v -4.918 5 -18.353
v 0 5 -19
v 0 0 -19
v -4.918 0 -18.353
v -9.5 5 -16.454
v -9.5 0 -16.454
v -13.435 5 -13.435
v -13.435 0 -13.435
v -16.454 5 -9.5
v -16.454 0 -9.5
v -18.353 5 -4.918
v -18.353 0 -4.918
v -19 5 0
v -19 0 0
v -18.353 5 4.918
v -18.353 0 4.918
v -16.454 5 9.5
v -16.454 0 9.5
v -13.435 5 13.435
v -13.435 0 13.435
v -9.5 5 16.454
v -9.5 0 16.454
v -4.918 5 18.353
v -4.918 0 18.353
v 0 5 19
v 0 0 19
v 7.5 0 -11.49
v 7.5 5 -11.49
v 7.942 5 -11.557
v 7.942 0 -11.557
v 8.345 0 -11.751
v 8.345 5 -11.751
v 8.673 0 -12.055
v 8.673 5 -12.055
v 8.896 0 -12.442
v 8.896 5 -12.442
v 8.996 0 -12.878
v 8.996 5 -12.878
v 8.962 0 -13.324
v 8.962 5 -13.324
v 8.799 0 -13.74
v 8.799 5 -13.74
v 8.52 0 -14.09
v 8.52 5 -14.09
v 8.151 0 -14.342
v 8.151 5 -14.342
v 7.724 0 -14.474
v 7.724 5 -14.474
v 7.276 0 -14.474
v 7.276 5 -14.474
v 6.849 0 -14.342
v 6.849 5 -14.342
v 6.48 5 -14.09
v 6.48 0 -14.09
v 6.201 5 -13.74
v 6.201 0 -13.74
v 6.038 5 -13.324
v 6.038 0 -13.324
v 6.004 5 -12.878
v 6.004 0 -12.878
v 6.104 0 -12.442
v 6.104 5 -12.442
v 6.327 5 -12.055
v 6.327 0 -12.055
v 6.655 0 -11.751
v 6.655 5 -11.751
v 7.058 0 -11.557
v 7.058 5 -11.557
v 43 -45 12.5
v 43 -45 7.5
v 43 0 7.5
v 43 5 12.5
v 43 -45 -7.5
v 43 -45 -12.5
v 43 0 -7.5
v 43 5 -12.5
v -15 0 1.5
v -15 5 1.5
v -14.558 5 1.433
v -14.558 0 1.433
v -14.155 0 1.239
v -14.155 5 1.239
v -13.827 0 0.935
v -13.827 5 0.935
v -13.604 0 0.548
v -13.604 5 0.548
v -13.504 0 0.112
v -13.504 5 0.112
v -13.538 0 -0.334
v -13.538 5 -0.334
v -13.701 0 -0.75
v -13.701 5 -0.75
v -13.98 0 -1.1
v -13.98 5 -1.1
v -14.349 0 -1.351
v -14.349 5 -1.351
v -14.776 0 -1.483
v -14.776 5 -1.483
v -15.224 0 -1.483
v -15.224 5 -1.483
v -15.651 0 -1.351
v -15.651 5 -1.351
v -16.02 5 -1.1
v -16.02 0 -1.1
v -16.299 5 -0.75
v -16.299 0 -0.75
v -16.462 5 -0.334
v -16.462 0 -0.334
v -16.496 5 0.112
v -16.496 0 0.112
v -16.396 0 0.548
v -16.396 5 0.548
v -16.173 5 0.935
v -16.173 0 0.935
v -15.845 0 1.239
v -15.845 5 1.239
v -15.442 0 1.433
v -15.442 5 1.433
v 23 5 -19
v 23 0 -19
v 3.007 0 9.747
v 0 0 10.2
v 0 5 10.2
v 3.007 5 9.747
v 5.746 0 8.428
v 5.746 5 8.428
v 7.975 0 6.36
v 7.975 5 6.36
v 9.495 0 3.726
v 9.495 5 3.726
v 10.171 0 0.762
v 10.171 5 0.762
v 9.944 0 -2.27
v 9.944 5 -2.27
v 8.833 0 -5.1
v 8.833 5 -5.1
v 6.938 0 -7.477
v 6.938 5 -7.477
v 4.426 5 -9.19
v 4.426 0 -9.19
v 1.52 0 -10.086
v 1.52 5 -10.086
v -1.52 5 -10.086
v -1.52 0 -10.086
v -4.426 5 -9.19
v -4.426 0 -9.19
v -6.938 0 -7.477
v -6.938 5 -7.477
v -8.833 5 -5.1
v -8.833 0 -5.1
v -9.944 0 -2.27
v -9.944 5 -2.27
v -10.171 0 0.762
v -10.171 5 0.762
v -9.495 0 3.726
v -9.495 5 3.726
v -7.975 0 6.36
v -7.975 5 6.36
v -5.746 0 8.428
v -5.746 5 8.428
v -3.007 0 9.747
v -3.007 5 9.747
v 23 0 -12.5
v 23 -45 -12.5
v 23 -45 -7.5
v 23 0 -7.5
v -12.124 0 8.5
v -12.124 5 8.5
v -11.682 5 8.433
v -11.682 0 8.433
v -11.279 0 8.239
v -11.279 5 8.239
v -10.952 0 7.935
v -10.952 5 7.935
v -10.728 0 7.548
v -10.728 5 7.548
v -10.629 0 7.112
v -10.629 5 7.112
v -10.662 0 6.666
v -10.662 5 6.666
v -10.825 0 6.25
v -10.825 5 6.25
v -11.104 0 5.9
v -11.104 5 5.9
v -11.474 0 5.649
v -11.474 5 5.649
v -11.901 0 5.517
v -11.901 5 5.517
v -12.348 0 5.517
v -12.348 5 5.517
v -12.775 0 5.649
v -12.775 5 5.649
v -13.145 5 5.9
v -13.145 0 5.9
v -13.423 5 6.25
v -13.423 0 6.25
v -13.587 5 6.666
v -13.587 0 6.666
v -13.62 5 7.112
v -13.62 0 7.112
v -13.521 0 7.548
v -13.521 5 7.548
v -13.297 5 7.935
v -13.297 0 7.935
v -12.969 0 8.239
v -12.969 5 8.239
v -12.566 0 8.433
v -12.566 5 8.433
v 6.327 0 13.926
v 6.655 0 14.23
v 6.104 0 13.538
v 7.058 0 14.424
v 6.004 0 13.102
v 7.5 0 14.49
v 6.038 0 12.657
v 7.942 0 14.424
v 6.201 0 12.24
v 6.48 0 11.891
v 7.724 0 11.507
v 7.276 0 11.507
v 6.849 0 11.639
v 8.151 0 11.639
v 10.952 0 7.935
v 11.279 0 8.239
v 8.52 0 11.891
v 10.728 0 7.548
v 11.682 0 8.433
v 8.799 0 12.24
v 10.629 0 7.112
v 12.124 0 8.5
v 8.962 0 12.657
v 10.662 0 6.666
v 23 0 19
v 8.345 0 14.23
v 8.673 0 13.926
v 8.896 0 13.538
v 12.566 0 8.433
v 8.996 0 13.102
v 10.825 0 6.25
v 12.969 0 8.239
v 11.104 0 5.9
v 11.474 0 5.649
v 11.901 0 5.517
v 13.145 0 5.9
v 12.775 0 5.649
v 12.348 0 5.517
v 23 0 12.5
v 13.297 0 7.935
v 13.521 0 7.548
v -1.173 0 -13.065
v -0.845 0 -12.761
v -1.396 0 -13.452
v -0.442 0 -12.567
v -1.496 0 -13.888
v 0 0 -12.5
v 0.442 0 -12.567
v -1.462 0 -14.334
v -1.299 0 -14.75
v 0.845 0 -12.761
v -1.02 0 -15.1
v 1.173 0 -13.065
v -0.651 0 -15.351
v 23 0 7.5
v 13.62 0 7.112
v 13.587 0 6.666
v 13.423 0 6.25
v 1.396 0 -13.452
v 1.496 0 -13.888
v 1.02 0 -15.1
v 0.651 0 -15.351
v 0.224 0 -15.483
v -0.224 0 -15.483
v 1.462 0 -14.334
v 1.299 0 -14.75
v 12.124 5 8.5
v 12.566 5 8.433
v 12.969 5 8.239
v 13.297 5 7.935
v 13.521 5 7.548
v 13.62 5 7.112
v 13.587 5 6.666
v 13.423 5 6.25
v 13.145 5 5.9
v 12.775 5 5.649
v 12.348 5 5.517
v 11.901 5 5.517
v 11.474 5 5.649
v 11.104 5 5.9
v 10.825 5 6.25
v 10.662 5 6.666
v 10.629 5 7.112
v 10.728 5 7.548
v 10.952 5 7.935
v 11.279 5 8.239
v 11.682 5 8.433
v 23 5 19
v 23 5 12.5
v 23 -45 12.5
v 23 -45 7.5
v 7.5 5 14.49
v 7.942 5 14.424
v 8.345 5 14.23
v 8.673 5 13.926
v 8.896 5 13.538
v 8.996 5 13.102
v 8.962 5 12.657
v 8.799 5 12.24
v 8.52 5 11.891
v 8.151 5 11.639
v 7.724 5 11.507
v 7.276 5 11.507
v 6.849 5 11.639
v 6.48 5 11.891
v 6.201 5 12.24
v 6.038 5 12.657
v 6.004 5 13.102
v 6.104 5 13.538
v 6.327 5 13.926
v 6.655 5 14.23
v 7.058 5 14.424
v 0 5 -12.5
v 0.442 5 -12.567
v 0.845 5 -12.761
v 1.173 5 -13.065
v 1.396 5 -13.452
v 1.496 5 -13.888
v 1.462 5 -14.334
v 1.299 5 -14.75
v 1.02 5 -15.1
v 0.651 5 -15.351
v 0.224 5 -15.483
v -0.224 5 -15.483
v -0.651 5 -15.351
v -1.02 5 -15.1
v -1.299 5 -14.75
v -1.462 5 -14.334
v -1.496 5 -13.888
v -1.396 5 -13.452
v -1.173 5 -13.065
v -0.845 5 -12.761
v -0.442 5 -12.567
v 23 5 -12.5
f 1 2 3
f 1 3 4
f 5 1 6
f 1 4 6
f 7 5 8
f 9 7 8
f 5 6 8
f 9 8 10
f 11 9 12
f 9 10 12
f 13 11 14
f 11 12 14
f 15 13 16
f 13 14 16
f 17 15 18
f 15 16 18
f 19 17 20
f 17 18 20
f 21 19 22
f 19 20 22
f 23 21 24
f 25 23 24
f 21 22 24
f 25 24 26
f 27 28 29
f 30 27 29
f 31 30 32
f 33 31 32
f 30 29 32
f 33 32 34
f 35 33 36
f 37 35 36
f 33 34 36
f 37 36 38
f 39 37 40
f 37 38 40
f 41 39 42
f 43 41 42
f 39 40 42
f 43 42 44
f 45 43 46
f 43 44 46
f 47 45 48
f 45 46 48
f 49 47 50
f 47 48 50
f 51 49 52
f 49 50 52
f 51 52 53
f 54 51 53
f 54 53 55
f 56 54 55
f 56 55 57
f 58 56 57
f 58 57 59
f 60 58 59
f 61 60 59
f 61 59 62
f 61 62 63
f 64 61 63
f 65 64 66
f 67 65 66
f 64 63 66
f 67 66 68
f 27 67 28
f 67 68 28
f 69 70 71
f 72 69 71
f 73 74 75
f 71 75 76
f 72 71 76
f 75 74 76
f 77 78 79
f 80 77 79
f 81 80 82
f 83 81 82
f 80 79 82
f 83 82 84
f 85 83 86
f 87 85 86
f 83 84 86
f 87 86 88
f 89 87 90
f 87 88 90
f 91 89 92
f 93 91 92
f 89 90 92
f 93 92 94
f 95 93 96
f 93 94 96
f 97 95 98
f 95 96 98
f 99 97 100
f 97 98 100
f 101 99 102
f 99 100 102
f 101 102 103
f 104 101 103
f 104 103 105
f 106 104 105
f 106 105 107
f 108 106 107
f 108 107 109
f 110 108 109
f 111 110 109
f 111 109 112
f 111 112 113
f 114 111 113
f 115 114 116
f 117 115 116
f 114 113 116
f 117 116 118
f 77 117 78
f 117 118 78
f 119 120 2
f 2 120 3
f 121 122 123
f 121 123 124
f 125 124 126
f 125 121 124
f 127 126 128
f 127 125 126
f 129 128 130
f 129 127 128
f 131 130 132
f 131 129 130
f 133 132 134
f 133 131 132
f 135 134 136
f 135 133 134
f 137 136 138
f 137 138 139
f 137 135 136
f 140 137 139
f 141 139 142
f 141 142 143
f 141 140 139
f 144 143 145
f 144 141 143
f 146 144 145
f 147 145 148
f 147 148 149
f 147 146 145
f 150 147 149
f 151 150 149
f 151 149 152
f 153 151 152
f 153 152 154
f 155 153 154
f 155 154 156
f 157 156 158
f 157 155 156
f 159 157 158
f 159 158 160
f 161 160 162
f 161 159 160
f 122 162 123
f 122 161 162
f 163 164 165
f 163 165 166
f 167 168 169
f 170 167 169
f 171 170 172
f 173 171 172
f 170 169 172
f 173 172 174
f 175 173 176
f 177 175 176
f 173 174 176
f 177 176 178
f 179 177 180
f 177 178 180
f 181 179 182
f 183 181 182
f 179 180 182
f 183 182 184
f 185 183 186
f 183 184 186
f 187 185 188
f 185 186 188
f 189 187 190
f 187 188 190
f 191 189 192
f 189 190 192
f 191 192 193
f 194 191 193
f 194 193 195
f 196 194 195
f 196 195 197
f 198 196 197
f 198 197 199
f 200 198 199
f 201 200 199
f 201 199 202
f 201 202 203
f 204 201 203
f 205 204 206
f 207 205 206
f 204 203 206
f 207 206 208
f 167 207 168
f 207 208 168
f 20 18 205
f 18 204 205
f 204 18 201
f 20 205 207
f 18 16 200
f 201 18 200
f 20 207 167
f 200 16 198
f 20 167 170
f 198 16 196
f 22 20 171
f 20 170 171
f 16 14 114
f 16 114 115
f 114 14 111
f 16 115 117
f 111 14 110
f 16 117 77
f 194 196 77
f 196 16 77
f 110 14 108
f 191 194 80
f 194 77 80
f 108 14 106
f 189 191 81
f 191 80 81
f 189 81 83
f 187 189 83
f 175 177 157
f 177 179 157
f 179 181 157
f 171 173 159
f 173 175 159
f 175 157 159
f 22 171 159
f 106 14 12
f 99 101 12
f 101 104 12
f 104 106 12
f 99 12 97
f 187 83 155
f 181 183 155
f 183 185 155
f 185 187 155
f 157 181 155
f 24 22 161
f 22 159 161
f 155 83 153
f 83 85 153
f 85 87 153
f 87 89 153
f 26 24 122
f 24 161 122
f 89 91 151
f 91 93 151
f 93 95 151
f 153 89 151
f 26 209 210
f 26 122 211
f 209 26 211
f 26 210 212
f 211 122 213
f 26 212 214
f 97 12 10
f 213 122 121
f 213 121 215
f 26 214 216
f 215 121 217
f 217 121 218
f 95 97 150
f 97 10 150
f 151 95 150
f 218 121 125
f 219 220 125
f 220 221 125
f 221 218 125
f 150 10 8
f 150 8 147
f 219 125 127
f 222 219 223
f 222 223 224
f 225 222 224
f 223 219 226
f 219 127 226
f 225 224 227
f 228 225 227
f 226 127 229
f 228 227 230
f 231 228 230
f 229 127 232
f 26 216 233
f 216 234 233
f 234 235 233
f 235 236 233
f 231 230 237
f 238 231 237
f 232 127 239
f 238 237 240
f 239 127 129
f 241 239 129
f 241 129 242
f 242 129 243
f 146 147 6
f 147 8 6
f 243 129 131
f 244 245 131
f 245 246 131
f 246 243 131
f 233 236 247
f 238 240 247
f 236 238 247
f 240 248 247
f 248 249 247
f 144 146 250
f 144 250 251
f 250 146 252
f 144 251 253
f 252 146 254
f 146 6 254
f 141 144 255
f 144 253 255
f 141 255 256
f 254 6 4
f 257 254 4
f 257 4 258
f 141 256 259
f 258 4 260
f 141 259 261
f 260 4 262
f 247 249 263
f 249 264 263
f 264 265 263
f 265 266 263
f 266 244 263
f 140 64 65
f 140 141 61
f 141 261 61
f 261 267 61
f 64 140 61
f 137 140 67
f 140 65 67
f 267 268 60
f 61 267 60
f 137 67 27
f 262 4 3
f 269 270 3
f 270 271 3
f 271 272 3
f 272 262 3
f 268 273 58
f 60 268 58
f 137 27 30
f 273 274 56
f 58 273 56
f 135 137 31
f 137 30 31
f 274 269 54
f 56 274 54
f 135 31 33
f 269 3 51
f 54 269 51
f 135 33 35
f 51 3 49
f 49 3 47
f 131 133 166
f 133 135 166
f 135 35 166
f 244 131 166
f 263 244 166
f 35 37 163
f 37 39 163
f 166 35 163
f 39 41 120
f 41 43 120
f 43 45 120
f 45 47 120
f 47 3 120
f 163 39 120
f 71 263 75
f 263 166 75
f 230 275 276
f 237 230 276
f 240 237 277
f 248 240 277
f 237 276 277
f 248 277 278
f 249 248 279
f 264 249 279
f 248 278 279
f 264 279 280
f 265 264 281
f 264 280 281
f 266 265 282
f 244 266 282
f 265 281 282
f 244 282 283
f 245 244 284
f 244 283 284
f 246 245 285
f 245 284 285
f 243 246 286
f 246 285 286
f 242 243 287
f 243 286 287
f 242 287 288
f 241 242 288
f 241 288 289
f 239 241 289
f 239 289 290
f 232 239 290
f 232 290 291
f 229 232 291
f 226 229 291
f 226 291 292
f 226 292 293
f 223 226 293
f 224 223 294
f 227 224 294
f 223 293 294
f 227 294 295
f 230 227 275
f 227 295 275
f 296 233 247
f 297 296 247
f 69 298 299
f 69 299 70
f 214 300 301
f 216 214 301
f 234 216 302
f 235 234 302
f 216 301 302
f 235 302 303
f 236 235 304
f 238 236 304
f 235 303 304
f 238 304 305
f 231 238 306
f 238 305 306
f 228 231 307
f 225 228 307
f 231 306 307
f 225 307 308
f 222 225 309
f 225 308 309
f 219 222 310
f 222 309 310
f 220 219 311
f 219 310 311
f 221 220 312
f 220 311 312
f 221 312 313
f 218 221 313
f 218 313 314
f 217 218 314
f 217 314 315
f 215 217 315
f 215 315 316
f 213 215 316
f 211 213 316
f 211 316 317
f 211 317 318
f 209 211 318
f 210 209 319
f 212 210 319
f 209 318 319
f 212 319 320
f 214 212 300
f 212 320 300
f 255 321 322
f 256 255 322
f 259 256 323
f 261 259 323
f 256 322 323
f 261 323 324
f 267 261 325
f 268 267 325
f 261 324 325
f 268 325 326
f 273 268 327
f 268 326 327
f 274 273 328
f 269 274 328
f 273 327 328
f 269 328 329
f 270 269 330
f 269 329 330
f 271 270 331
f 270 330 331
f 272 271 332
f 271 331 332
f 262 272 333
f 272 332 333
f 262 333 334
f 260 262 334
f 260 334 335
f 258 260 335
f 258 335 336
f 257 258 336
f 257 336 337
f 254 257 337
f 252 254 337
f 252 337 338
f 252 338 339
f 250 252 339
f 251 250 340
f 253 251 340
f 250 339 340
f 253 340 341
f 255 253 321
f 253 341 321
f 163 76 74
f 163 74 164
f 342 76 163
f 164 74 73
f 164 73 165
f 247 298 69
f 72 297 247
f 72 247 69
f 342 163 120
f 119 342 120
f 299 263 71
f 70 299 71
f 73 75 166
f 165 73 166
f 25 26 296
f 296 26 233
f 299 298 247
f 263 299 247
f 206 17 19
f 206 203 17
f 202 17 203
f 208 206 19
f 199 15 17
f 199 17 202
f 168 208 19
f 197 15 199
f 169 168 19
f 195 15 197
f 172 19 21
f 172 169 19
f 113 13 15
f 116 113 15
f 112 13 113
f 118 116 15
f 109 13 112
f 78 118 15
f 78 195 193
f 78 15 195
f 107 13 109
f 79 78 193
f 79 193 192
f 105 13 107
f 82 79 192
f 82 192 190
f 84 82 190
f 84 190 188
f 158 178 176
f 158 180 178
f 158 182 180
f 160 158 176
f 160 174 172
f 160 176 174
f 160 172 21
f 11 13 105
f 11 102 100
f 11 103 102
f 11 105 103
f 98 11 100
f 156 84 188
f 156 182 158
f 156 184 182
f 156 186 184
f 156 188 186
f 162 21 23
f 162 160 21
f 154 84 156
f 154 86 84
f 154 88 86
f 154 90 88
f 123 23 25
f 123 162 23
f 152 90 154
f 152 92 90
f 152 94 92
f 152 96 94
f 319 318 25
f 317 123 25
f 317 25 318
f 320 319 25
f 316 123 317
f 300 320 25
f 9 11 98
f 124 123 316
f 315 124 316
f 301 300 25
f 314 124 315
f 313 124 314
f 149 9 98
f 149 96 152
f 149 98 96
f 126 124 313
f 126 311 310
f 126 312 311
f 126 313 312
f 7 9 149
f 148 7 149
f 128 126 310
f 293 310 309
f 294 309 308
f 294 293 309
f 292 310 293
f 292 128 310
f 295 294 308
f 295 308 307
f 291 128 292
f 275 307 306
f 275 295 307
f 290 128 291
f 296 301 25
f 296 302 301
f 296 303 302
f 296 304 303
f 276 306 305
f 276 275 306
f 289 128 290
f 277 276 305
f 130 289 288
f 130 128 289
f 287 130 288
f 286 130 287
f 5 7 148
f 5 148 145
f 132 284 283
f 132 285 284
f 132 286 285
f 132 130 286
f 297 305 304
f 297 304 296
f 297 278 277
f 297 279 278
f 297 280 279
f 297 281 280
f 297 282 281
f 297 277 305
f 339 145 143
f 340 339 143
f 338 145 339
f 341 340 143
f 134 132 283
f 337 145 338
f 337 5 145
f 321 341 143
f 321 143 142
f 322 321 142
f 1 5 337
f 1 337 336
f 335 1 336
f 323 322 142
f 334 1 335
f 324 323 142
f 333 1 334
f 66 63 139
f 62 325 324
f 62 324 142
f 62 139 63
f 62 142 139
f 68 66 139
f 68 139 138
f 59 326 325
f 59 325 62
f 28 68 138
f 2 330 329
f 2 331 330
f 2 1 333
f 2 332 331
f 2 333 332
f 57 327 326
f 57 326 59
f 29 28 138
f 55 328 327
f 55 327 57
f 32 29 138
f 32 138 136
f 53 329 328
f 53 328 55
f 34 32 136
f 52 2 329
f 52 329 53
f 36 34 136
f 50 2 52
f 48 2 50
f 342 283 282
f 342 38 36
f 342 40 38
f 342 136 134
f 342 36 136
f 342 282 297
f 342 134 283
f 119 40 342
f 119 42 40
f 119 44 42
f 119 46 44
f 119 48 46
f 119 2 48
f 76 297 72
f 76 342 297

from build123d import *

# Parameters (mm, degrees)
SKETCH1_R           = 19
SKETCH1_R_2         = 10.2
BOSS_EXTRUDE1_DEPTH = 5
SKETCH2_R           = 1.5
CUT_EXTRUDE1_DEPTH  = 5
BOSS_EXTRUDE2_START = -5
BOSS_EXTRUDE2_DEPTH = 5
SKETCH7_W           = 25
SKETCH7_H           = 5
BOSS_EXTRUDE5_DEPTH = 20
SKETCH8_W           = 20
SKETCH8_H           = 50
BOSS_EXTRUDE6_DEPTH = 5
SKETCH9_W           = 20
SKETCH9_H           = 50
BOSS_EXTRUDE7_DEPTH = 5


with BuildPart() as part:
    # Sketch1 → Boss-Extrude1 (new body)
    with BuildSketch(Plane(origin=(0, 0, 0), x_dir=(1, 0, 0), z_dir=(0, 1, 0))):
        with Locations(Location((0, 0, 0), (0, 0, 270))):
            Circle(SKETCH1_R)
        with Locations(Location((0, 0, 0), (0, 0, 270))):
            Circle(SKETCH1_R_2, mode=Mode.SUBTRACT)
    extrude(amount=BOSS_EXTRUDE1_DEPTH)

    # Sketch2 → Cut-Extrude1 (cut)
    with BuildSketch(Plane(origin=(0, 5, 0), x_dir=(1, 0, 0), z_dir=(0, 1, 0))):
        with Locations(Location((0, 14, 0), (0, 0, 270))):
            Circle(SKETCH2_R)
        with Locations(Location((7.5, 12.990381057, 0), (0, 0, 270))):
            Circle(SKETCH2_R)
        with Locations(Location((12.124355653, -7, 0), (0, 0, 270))):
            Circle(SKETCH2_R)
        with Locations(Location((7.5, -12.990381057, 0), (0, 0, 270))):
            Circle(SKETCH2_R)
        with Locations(Location((-12.124355653, -7, 0), (0, 0, 270))):
            Circle(SKETCH2_R)
        with Locations(Location((-15, 0, 0), (0, 0, 270))):
            Circle(SKETCH2_R)
    extrude(amount=-CUT_EXTRUDE1_DEPTH, mode=Mode.SUBTRACT)

    # Sketch3 → Boss-Extrude2 (add)
    with BuildSketch(Plane(origin=(0, 5, 0), x_dir=(1, 0, 0), z_dir=(0, 1, 0)).offset(BOSS_EXTRUDE2_START)):
        with BuildLine():
            ThreePointArc((19, 0), (13.435028843, -13.435028843), (0, -19))
            Line((0, -19), (23, -19))
            Line((23, -19), (23, 19))
            Line((23, 19), (0, 19))
            ThreePointArc((0, 19), (13.435028843, 13.435028843), (19, 0))
        make_face()
    extrude(amount=BOSS_EXTRUDE2_DEPTH)

    # Sketch7 → Boss-Extrude5 (add)
    with BuildSketch(Plane(origin=(23, 0, 0), x_dir=(0, 0, -1), z_dir=(1, 0, 0))):
        with Locations((0, 2.5)):
            Rectangle(SKETCH7_W, SKETCH7_H)
    extrude(amount=BOSS_EXTRUDE5_DEPTH)

    # Sketch8 → Boss-Extrude6 (add)
    with BuildSketch(Plane.XY.offset(12.5)):
        with Locations((33, -20)):
            Rectangle(SKETCH8_W, SKETCH8_H)
    extrude(amount=-BOSS_EXTRUDE6_DEPTH)

    # Sketch9 → Boss-Extrude7 (add)
    with BuildSketch(Plane(origin=(0, 0, -12.5), x_dir=(-1, 0, 0), z_dir=(0, 0, -1))):
        with Locations((-33, -20)):
            Rectangle(SKETCH9_W, SKETCH9_H)
    extrude(amount=-BOSS_EXTRUDE7_DEPTH)


solid = part.part
